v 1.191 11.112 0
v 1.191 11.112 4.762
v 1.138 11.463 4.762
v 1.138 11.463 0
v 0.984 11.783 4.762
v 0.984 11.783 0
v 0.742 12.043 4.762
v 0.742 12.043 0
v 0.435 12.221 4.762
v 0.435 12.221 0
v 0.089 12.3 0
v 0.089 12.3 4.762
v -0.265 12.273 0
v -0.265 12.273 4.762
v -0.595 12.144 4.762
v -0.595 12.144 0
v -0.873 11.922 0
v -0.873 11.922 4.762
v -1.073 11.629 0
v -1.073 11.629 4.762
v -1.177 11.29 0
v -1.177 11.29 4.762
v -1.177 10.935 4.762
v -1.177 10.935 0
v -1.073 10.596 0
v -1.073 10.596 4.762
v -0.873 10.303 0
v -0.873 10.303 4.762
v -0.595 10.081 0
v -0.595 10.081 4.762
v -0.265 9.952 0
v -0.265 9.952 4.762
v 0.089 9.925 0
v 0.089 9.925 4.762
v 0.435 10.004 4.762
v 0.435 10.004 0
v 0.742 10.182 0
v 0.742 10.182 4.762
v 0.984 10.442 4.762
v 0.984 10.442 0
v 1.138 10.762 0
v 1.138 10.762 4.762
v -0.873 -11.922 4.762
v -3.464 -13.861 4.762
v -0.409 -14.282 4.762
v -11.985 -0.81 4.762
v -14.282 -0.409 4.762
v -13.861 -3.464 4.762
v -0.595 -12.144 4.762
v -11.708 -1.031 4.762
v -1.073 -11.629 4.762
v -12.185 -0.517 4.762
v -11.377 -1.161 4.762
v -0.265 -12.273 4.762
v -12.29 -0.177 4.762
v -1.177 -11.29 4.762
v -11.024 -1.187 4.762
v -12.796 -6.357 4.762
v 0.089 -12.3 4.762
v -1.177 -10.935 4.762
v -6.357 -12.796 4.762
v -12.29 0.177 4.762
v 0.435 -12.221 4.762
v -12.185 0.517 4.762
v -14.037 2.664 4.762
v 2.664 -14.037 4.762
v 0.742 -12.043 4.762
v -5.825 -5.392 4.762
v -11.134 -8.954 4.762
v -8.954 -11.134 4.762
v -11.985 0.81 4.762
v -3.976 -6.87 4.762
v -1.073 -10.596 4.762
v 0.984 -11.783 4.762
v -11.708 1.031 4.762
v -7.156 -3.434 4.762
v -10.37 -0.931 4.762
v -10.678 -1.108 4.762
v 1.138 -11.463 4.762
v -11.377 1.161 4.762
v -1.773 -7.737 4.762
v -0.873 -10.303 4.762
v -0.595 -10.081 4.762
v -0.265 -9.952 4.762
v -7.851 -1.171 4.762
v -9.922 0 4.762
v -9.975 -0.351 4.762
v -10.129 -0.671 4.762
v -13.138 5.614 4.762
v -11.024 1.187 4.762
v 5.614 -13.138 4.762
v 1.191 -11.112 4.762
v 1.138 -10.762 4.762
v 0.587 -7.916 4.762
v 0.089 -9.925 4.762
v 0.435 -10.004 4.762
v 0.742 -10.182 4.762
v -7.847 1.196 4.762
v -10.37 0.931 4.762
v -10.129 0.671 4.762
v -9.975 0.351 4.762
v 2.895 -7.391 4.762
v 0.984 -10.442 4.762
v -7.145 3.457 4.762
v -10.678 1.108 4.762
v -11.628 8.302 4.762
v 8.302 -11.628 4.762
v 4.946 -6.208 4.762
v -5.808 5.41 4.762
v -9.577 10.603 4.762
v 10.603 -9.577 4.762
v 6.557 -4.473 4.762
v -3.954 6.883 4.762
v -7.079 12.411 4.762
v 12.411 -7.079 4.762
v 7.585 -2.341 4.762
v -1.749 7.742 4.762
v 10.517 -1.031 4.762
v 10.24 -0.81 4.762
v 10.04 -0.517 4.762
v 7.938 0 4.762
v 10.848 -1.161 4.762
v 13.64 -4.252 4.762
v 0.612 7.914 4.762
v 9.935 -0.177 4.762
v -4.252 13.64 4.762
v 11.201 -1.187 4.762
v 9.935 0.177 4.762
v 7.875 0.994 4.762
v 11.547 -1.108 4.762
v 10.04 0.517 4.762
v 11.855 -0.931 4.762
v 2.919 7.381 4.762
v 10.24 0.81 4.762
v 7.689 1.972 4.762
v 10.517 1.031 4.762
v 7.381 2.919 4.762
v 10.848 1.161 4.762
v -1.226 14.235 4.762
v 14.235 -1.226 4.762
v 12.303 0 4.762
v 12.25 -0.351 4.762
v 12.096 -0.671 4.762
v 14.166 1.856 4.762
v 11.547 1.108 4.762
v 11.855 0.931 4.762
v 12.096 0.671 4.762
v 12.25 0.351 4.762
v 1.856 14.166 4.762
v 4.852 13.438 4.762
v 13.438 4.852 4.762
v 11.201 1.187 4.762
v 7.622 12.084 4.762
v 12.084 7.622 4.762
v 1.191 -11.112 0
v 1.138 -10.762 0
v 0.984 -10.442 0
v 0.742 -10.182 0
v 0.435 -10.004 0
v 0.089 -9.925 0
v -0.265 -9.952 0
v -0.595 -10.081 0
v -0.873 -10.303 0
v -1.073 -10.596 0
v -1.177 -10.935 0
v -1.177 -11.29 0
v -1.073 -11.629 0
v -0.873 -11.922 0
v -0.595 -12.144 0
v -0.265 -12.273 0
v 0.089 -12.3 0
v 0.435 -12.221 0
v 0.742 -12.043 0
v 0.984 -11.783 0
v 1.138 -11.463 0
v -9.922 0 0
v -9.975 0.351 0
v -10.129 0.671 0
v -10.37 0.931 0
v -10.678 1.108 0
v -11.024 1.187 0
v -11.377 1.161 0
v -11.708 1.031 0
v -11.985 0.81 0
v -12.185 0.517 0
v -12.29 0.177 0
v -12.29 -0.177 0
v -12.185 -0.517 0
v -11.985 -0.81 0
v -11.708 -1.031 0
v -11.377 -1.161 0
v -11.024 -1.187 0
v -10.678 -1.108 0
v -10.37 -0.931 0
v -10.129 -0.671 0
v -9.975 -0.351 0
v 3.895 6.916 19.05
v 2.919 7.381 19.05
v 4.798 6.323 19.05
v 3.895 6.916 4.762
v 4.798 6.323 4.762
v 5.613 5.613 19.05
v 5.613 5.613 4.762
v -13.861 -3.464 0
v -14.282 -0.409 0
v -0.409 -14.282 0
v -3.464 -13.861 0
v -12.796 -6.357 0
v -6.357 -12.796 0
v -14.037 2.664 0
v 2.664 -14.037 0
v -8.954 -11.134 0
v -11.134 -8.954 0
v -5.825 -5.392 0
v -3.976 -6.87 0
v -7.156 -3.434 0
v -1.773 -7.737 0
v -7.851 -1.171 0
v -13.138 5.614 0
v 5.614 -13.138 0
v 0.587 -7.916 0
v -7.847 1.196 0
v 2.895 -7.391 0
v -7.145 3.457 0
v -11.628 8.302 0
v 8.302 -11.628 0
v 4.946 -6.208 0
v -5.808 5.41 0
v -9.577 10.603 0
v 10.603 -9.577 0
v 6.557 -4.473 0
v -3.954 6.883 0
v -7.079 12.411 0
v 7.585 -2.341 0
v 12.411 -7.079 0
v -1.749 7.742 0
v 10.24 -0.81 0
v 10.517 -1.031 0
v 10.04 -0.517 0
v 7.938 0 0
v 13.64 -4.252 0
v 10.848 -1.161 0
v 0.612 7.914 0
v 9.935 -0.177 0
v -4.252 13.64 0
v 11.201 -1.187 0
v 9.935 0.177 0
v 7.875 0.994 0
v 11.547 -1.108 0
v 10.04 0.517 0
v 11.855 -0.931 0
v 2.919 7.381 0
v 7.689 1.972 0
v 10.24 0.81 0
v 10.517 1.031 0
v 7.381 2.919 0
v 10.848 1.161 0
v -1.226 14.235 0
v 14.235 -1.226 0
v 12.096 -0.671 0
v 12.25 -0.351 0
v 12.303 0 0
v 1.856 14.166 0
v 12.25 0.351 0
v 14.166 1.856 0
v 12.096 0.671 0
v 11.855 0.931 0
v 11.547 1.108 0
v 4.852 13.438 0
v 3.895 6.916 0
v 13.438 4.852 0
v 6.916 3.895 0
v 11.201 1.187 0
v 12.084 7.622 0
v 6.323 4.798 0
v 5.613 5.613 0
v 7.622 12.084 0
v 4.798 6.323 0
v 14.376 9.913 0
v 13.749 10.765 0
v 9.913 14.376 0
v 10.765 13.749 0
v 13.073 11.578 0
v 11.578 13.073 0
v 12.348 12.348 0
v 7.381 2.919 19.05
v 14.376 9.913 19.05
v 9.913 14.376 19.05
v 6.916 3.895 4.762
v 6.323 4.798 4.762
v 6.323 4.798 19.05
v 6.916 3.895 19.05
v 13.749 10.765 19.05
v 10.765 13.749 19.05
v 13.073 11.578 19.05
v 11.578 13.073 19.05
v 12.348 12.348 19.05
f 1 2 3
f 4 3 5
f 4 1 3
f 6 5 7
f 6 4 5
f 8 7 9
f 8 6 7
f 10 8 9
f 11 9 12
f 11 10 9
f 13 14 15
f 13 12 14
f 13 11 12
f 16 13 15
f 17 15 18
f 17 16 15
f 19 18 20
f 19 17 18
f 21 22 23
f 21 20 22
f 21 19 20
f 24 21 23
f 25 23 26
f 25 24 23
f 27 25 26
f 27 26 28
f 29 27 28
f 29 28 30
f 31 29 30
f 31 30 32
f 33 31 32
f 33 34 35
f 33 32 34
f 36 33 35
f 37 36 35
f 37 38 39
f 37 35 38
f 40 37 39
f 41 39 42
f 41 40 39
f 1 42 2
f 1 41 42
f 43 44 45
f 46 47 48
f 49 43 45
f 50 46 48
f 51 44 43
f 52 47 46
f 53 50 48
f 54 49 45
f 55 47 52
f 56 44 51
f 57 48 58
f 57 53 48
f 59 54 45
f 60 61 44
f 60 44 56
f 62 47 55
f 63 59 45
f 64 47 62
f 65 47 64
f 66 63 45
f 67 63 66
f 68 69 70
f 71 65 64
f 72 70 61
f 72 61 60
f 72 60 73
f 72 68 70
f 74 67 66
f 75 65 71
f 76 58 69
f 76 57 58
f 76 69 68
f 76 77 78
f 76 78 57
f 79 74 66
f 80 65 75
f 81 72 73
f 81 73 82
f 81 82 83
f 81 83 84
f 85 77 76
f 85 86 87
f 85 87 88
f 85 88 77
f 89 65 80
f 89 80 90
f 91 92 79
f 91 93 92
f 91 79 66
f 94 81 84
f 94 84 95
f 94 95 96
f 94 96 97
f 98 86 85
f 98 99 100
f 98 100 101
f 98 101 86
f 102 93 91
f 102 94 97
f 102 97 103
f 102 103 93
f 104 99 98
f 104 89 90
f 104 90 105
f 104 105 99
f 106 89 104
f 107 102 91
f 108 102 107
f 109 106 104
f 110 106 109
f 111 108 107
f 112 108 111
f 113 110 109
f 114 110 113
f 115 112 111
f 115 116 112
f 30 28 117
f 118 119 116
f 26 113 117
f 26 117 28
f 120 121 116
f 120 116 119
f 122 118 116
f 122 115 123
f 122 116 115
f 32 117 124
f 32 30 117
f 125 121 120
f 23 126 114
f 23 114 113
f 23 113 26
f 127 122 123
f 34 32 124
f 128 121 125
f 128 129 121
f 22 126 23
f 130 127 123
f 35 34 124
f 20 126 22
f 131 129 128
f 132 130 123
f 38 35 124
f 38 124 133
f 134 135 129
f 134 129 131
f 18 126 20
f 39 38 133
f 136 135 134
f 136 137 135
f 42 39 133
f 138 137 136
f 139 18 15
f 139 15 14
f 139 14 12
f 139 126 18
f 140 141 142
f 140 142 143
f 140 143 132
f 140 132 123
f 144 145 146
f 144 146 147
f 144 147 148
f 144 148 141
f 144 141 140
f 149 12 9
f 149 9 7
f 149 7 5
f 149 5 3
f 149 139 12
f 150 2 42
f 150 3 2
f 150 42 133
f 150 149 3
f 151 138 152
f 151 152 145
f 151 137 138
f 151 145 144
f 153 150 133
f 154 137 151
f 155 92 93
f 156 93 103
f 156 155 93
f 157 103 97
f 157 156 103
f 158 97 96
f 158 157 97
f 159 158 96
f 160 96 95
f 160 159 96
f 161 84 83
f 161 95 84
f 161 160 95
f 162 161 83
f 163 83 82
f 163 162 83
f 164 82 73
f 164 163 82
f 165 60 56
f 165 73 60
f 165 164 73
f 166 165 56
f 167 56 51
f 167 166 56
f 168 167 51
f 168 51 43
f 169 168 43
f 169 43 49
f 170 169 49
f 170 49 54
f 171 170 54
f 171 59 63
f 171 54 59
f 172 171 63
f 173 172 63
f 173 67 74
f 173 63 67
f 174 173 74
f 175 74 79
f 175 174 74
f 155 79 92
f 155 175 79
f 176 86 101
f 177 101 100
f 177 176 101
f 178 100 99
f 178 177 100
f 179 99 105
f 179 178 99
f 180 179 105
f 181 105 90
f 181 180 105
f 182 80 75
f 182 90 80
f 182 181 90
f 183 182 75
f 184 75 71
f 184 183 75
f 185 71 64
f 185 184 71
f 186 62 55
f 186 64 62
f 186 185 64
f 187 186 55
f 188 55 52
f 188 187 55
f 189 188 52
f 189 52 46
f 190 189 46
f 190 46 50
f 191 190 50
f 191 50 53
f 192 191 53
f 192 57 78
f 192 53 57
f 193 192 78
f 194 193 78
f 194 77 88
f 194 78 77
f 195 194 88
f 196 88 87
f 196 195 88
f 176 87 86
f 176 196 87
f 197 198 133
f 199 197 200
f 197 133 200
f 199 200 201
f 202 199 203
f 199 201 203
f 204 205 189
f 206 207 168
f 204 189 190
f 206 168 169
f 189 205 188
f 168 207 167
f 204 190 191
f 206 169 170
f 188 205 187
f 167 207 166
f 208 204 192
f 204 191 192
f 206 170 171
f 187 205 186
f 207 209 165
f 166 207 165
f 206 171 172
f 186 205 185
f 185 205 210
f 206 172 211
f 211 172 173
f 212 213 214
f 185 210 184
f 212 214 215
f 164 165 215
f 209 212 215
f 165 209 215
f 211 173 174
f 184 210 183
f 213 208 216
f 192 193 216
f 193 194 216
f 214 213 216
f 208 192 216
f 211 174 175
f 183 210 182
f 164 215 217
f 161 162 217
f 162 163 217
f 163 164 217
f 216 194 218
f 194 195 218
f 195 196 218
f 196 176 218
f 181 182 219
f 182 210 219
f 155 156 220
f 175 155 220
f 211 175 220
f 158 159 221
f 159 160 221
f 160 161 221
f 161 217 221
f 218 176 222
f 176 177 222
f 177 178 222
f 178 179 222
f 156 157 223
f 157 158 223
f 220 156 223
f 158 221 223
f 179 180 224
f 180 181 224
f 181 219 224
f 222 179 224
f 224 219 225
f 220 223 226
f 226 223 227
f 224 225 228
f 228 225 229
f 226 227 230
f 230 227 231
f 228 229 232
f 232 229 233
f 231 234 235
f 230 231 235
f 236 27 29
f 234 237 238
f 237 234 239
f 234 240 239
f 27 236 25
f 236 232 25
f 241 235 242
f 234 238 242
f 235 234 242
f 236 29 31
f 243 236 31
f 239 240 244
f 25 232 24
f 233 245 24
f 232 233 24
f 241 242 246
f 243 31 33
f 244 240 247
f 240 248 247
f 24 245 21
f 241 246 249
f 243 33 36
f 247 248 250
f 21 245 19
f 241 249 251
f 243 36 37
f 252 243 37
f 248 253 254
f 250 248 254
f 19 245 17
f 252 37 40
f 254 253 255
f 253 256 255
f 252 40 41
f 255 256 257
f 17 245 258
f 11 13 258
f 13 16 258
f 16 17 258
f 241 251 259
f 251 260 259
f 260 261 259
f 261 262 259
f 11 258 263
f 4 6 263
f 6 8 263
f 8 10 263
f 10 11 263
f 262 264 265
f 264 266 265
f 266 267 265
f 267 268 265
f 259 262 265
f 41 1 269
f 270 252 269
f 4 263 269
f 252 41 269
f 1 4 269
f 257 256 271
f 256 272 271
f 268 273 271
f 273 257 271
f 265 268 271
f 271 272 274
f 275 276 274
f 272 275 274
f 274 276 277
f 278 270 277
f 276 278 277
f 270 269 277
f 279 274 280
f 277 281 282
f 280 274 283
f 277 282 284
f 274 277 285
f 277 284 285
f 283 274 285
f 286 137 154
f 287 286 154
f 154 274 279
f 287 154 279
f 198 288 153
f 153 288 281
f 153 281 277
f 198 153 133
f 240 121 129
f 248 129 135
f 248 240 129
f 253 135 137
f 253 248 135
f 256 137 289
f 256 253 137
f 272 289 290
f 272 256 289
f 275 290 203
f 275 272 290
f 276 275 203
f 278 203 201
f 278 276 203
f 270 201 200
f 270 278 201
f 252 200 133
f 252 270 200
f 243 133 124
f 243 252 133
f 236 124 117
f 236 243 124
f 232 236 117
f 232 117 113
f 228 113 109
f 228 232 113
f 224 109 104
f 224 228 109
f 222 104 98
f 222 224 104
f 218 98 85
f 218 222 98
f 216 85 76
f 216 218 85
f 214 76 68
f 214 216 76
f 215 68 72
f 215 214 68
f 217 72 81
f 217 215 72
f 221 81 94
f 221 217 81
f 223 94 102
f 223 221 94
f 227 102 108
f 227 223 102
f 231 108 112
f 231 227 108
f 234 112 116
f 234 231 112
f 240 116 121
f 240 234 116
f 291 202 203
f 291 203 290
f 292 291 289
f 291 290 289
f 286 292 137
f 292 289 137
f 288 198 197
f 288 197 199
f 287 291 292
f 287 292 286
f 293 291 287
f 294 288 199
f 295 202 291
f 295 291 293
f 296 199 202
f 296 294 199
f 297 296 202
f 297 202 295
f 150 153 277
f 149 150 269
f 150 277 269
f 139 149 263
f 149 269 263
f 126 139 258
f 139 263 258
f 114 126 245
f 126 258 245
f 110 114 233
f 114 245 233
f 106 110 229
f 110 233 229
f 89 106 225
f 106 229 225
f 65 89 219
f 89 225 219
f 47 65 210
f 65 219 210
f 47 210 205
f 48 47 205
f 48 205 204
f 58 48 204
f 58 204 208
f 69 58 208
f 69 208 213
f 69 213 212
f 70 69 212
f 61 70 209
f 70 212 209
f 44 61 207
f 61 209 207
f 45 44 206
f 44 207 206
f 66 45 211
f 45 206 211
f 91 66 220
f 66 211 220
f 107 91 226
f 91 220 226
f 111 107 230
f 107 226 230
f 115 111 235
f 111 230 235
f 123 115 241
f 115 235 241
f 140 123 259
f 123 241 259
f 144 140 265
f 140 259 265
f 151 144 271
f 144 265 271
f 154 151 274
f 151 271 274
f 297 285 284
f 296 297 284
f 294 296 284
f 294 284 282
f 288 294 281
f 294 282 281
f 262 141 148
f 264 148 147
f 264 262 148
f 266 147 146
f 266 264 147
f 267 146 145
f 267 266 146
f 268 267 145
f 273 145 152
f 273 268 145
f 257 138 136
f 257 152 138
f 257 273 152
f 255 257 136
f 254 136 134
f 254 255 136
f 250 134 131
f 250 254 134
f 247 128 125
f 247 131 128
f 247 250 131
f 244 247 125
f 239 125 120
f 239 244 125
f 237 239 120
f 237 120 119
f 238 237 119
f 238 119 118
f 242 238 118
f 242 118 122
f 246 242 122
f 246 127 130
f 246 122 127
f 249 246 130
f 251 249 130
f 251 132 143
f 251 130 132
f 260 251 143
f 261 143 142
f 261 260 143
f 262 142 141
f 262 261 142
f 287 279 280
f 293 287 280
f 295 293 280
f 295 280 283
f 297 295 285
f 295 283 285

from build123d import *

# Parameters (mm, degrees)
F0_R     = 14.2875
F0_R_2   = 7.9375
F1_DEPTH = 4.7625
F2_R     = 1.190625
F3_DEPTH = 25.4
F5_DEPTH = 19.05


with BuildPart() as f1:
    # F0 (on Top) → F1 (new body)
    with BuildSketch(Plane.XY):
        Circle(F0_R)
        Circle(F0_R_2, mode=Mode.SUBTRACT)
    extrude(amount=F1_DEPTH)

    # F2 (on Top) → F3 (cut)
    with BuildSketch(Plane.XY):
        with Locations((0, 11.1125)):
            Circle(F2_R)
        with Locations((11.1125, 0)):
            Circle(F2_R)
        with Locations((-11.1125, 0)):
            Circle(F2_R)
        with Locations((0, -11.1125)):
            Circle(F2_R)
    extrude(amount=F3_DEPTH, mode=Mode.SUBTRACT)

    # F4 (on Top) → F5 (join)
    with BuildSketch(Plane.XY):
        with BuildLine():
            Line((5.61266, 5.61266), (12.347852, 12.347852))
            ThreePointArc((12.347852, 12.347852), (11.176734, 13.417135), (9.91344, 14.375765))
            Line((9.91344, 14.375765), (2.91897, 7.381295))
            ThreePointArc((2.91897, 7.381295), (4.356512, 6.635112), (5.61266, 5.61266))
        make_face()
        with BuildLine():
            Line((7.381295, 2.91897), (14.375765, 9.91344))
            ThreePointArc((14.375765, 9.91344), (13.417135, 11.176734), (12.347852, 12.347852))
            Line((12.347852, 12.347852), (5.61266, 5.61266))
            ThreePointArc((5.61266, 5.61266), (6.635112, 4.356512), (7.381295, 2.91897))
        make_face()
    extrude(amount=F5_DEPTH)


solid = f1.part
